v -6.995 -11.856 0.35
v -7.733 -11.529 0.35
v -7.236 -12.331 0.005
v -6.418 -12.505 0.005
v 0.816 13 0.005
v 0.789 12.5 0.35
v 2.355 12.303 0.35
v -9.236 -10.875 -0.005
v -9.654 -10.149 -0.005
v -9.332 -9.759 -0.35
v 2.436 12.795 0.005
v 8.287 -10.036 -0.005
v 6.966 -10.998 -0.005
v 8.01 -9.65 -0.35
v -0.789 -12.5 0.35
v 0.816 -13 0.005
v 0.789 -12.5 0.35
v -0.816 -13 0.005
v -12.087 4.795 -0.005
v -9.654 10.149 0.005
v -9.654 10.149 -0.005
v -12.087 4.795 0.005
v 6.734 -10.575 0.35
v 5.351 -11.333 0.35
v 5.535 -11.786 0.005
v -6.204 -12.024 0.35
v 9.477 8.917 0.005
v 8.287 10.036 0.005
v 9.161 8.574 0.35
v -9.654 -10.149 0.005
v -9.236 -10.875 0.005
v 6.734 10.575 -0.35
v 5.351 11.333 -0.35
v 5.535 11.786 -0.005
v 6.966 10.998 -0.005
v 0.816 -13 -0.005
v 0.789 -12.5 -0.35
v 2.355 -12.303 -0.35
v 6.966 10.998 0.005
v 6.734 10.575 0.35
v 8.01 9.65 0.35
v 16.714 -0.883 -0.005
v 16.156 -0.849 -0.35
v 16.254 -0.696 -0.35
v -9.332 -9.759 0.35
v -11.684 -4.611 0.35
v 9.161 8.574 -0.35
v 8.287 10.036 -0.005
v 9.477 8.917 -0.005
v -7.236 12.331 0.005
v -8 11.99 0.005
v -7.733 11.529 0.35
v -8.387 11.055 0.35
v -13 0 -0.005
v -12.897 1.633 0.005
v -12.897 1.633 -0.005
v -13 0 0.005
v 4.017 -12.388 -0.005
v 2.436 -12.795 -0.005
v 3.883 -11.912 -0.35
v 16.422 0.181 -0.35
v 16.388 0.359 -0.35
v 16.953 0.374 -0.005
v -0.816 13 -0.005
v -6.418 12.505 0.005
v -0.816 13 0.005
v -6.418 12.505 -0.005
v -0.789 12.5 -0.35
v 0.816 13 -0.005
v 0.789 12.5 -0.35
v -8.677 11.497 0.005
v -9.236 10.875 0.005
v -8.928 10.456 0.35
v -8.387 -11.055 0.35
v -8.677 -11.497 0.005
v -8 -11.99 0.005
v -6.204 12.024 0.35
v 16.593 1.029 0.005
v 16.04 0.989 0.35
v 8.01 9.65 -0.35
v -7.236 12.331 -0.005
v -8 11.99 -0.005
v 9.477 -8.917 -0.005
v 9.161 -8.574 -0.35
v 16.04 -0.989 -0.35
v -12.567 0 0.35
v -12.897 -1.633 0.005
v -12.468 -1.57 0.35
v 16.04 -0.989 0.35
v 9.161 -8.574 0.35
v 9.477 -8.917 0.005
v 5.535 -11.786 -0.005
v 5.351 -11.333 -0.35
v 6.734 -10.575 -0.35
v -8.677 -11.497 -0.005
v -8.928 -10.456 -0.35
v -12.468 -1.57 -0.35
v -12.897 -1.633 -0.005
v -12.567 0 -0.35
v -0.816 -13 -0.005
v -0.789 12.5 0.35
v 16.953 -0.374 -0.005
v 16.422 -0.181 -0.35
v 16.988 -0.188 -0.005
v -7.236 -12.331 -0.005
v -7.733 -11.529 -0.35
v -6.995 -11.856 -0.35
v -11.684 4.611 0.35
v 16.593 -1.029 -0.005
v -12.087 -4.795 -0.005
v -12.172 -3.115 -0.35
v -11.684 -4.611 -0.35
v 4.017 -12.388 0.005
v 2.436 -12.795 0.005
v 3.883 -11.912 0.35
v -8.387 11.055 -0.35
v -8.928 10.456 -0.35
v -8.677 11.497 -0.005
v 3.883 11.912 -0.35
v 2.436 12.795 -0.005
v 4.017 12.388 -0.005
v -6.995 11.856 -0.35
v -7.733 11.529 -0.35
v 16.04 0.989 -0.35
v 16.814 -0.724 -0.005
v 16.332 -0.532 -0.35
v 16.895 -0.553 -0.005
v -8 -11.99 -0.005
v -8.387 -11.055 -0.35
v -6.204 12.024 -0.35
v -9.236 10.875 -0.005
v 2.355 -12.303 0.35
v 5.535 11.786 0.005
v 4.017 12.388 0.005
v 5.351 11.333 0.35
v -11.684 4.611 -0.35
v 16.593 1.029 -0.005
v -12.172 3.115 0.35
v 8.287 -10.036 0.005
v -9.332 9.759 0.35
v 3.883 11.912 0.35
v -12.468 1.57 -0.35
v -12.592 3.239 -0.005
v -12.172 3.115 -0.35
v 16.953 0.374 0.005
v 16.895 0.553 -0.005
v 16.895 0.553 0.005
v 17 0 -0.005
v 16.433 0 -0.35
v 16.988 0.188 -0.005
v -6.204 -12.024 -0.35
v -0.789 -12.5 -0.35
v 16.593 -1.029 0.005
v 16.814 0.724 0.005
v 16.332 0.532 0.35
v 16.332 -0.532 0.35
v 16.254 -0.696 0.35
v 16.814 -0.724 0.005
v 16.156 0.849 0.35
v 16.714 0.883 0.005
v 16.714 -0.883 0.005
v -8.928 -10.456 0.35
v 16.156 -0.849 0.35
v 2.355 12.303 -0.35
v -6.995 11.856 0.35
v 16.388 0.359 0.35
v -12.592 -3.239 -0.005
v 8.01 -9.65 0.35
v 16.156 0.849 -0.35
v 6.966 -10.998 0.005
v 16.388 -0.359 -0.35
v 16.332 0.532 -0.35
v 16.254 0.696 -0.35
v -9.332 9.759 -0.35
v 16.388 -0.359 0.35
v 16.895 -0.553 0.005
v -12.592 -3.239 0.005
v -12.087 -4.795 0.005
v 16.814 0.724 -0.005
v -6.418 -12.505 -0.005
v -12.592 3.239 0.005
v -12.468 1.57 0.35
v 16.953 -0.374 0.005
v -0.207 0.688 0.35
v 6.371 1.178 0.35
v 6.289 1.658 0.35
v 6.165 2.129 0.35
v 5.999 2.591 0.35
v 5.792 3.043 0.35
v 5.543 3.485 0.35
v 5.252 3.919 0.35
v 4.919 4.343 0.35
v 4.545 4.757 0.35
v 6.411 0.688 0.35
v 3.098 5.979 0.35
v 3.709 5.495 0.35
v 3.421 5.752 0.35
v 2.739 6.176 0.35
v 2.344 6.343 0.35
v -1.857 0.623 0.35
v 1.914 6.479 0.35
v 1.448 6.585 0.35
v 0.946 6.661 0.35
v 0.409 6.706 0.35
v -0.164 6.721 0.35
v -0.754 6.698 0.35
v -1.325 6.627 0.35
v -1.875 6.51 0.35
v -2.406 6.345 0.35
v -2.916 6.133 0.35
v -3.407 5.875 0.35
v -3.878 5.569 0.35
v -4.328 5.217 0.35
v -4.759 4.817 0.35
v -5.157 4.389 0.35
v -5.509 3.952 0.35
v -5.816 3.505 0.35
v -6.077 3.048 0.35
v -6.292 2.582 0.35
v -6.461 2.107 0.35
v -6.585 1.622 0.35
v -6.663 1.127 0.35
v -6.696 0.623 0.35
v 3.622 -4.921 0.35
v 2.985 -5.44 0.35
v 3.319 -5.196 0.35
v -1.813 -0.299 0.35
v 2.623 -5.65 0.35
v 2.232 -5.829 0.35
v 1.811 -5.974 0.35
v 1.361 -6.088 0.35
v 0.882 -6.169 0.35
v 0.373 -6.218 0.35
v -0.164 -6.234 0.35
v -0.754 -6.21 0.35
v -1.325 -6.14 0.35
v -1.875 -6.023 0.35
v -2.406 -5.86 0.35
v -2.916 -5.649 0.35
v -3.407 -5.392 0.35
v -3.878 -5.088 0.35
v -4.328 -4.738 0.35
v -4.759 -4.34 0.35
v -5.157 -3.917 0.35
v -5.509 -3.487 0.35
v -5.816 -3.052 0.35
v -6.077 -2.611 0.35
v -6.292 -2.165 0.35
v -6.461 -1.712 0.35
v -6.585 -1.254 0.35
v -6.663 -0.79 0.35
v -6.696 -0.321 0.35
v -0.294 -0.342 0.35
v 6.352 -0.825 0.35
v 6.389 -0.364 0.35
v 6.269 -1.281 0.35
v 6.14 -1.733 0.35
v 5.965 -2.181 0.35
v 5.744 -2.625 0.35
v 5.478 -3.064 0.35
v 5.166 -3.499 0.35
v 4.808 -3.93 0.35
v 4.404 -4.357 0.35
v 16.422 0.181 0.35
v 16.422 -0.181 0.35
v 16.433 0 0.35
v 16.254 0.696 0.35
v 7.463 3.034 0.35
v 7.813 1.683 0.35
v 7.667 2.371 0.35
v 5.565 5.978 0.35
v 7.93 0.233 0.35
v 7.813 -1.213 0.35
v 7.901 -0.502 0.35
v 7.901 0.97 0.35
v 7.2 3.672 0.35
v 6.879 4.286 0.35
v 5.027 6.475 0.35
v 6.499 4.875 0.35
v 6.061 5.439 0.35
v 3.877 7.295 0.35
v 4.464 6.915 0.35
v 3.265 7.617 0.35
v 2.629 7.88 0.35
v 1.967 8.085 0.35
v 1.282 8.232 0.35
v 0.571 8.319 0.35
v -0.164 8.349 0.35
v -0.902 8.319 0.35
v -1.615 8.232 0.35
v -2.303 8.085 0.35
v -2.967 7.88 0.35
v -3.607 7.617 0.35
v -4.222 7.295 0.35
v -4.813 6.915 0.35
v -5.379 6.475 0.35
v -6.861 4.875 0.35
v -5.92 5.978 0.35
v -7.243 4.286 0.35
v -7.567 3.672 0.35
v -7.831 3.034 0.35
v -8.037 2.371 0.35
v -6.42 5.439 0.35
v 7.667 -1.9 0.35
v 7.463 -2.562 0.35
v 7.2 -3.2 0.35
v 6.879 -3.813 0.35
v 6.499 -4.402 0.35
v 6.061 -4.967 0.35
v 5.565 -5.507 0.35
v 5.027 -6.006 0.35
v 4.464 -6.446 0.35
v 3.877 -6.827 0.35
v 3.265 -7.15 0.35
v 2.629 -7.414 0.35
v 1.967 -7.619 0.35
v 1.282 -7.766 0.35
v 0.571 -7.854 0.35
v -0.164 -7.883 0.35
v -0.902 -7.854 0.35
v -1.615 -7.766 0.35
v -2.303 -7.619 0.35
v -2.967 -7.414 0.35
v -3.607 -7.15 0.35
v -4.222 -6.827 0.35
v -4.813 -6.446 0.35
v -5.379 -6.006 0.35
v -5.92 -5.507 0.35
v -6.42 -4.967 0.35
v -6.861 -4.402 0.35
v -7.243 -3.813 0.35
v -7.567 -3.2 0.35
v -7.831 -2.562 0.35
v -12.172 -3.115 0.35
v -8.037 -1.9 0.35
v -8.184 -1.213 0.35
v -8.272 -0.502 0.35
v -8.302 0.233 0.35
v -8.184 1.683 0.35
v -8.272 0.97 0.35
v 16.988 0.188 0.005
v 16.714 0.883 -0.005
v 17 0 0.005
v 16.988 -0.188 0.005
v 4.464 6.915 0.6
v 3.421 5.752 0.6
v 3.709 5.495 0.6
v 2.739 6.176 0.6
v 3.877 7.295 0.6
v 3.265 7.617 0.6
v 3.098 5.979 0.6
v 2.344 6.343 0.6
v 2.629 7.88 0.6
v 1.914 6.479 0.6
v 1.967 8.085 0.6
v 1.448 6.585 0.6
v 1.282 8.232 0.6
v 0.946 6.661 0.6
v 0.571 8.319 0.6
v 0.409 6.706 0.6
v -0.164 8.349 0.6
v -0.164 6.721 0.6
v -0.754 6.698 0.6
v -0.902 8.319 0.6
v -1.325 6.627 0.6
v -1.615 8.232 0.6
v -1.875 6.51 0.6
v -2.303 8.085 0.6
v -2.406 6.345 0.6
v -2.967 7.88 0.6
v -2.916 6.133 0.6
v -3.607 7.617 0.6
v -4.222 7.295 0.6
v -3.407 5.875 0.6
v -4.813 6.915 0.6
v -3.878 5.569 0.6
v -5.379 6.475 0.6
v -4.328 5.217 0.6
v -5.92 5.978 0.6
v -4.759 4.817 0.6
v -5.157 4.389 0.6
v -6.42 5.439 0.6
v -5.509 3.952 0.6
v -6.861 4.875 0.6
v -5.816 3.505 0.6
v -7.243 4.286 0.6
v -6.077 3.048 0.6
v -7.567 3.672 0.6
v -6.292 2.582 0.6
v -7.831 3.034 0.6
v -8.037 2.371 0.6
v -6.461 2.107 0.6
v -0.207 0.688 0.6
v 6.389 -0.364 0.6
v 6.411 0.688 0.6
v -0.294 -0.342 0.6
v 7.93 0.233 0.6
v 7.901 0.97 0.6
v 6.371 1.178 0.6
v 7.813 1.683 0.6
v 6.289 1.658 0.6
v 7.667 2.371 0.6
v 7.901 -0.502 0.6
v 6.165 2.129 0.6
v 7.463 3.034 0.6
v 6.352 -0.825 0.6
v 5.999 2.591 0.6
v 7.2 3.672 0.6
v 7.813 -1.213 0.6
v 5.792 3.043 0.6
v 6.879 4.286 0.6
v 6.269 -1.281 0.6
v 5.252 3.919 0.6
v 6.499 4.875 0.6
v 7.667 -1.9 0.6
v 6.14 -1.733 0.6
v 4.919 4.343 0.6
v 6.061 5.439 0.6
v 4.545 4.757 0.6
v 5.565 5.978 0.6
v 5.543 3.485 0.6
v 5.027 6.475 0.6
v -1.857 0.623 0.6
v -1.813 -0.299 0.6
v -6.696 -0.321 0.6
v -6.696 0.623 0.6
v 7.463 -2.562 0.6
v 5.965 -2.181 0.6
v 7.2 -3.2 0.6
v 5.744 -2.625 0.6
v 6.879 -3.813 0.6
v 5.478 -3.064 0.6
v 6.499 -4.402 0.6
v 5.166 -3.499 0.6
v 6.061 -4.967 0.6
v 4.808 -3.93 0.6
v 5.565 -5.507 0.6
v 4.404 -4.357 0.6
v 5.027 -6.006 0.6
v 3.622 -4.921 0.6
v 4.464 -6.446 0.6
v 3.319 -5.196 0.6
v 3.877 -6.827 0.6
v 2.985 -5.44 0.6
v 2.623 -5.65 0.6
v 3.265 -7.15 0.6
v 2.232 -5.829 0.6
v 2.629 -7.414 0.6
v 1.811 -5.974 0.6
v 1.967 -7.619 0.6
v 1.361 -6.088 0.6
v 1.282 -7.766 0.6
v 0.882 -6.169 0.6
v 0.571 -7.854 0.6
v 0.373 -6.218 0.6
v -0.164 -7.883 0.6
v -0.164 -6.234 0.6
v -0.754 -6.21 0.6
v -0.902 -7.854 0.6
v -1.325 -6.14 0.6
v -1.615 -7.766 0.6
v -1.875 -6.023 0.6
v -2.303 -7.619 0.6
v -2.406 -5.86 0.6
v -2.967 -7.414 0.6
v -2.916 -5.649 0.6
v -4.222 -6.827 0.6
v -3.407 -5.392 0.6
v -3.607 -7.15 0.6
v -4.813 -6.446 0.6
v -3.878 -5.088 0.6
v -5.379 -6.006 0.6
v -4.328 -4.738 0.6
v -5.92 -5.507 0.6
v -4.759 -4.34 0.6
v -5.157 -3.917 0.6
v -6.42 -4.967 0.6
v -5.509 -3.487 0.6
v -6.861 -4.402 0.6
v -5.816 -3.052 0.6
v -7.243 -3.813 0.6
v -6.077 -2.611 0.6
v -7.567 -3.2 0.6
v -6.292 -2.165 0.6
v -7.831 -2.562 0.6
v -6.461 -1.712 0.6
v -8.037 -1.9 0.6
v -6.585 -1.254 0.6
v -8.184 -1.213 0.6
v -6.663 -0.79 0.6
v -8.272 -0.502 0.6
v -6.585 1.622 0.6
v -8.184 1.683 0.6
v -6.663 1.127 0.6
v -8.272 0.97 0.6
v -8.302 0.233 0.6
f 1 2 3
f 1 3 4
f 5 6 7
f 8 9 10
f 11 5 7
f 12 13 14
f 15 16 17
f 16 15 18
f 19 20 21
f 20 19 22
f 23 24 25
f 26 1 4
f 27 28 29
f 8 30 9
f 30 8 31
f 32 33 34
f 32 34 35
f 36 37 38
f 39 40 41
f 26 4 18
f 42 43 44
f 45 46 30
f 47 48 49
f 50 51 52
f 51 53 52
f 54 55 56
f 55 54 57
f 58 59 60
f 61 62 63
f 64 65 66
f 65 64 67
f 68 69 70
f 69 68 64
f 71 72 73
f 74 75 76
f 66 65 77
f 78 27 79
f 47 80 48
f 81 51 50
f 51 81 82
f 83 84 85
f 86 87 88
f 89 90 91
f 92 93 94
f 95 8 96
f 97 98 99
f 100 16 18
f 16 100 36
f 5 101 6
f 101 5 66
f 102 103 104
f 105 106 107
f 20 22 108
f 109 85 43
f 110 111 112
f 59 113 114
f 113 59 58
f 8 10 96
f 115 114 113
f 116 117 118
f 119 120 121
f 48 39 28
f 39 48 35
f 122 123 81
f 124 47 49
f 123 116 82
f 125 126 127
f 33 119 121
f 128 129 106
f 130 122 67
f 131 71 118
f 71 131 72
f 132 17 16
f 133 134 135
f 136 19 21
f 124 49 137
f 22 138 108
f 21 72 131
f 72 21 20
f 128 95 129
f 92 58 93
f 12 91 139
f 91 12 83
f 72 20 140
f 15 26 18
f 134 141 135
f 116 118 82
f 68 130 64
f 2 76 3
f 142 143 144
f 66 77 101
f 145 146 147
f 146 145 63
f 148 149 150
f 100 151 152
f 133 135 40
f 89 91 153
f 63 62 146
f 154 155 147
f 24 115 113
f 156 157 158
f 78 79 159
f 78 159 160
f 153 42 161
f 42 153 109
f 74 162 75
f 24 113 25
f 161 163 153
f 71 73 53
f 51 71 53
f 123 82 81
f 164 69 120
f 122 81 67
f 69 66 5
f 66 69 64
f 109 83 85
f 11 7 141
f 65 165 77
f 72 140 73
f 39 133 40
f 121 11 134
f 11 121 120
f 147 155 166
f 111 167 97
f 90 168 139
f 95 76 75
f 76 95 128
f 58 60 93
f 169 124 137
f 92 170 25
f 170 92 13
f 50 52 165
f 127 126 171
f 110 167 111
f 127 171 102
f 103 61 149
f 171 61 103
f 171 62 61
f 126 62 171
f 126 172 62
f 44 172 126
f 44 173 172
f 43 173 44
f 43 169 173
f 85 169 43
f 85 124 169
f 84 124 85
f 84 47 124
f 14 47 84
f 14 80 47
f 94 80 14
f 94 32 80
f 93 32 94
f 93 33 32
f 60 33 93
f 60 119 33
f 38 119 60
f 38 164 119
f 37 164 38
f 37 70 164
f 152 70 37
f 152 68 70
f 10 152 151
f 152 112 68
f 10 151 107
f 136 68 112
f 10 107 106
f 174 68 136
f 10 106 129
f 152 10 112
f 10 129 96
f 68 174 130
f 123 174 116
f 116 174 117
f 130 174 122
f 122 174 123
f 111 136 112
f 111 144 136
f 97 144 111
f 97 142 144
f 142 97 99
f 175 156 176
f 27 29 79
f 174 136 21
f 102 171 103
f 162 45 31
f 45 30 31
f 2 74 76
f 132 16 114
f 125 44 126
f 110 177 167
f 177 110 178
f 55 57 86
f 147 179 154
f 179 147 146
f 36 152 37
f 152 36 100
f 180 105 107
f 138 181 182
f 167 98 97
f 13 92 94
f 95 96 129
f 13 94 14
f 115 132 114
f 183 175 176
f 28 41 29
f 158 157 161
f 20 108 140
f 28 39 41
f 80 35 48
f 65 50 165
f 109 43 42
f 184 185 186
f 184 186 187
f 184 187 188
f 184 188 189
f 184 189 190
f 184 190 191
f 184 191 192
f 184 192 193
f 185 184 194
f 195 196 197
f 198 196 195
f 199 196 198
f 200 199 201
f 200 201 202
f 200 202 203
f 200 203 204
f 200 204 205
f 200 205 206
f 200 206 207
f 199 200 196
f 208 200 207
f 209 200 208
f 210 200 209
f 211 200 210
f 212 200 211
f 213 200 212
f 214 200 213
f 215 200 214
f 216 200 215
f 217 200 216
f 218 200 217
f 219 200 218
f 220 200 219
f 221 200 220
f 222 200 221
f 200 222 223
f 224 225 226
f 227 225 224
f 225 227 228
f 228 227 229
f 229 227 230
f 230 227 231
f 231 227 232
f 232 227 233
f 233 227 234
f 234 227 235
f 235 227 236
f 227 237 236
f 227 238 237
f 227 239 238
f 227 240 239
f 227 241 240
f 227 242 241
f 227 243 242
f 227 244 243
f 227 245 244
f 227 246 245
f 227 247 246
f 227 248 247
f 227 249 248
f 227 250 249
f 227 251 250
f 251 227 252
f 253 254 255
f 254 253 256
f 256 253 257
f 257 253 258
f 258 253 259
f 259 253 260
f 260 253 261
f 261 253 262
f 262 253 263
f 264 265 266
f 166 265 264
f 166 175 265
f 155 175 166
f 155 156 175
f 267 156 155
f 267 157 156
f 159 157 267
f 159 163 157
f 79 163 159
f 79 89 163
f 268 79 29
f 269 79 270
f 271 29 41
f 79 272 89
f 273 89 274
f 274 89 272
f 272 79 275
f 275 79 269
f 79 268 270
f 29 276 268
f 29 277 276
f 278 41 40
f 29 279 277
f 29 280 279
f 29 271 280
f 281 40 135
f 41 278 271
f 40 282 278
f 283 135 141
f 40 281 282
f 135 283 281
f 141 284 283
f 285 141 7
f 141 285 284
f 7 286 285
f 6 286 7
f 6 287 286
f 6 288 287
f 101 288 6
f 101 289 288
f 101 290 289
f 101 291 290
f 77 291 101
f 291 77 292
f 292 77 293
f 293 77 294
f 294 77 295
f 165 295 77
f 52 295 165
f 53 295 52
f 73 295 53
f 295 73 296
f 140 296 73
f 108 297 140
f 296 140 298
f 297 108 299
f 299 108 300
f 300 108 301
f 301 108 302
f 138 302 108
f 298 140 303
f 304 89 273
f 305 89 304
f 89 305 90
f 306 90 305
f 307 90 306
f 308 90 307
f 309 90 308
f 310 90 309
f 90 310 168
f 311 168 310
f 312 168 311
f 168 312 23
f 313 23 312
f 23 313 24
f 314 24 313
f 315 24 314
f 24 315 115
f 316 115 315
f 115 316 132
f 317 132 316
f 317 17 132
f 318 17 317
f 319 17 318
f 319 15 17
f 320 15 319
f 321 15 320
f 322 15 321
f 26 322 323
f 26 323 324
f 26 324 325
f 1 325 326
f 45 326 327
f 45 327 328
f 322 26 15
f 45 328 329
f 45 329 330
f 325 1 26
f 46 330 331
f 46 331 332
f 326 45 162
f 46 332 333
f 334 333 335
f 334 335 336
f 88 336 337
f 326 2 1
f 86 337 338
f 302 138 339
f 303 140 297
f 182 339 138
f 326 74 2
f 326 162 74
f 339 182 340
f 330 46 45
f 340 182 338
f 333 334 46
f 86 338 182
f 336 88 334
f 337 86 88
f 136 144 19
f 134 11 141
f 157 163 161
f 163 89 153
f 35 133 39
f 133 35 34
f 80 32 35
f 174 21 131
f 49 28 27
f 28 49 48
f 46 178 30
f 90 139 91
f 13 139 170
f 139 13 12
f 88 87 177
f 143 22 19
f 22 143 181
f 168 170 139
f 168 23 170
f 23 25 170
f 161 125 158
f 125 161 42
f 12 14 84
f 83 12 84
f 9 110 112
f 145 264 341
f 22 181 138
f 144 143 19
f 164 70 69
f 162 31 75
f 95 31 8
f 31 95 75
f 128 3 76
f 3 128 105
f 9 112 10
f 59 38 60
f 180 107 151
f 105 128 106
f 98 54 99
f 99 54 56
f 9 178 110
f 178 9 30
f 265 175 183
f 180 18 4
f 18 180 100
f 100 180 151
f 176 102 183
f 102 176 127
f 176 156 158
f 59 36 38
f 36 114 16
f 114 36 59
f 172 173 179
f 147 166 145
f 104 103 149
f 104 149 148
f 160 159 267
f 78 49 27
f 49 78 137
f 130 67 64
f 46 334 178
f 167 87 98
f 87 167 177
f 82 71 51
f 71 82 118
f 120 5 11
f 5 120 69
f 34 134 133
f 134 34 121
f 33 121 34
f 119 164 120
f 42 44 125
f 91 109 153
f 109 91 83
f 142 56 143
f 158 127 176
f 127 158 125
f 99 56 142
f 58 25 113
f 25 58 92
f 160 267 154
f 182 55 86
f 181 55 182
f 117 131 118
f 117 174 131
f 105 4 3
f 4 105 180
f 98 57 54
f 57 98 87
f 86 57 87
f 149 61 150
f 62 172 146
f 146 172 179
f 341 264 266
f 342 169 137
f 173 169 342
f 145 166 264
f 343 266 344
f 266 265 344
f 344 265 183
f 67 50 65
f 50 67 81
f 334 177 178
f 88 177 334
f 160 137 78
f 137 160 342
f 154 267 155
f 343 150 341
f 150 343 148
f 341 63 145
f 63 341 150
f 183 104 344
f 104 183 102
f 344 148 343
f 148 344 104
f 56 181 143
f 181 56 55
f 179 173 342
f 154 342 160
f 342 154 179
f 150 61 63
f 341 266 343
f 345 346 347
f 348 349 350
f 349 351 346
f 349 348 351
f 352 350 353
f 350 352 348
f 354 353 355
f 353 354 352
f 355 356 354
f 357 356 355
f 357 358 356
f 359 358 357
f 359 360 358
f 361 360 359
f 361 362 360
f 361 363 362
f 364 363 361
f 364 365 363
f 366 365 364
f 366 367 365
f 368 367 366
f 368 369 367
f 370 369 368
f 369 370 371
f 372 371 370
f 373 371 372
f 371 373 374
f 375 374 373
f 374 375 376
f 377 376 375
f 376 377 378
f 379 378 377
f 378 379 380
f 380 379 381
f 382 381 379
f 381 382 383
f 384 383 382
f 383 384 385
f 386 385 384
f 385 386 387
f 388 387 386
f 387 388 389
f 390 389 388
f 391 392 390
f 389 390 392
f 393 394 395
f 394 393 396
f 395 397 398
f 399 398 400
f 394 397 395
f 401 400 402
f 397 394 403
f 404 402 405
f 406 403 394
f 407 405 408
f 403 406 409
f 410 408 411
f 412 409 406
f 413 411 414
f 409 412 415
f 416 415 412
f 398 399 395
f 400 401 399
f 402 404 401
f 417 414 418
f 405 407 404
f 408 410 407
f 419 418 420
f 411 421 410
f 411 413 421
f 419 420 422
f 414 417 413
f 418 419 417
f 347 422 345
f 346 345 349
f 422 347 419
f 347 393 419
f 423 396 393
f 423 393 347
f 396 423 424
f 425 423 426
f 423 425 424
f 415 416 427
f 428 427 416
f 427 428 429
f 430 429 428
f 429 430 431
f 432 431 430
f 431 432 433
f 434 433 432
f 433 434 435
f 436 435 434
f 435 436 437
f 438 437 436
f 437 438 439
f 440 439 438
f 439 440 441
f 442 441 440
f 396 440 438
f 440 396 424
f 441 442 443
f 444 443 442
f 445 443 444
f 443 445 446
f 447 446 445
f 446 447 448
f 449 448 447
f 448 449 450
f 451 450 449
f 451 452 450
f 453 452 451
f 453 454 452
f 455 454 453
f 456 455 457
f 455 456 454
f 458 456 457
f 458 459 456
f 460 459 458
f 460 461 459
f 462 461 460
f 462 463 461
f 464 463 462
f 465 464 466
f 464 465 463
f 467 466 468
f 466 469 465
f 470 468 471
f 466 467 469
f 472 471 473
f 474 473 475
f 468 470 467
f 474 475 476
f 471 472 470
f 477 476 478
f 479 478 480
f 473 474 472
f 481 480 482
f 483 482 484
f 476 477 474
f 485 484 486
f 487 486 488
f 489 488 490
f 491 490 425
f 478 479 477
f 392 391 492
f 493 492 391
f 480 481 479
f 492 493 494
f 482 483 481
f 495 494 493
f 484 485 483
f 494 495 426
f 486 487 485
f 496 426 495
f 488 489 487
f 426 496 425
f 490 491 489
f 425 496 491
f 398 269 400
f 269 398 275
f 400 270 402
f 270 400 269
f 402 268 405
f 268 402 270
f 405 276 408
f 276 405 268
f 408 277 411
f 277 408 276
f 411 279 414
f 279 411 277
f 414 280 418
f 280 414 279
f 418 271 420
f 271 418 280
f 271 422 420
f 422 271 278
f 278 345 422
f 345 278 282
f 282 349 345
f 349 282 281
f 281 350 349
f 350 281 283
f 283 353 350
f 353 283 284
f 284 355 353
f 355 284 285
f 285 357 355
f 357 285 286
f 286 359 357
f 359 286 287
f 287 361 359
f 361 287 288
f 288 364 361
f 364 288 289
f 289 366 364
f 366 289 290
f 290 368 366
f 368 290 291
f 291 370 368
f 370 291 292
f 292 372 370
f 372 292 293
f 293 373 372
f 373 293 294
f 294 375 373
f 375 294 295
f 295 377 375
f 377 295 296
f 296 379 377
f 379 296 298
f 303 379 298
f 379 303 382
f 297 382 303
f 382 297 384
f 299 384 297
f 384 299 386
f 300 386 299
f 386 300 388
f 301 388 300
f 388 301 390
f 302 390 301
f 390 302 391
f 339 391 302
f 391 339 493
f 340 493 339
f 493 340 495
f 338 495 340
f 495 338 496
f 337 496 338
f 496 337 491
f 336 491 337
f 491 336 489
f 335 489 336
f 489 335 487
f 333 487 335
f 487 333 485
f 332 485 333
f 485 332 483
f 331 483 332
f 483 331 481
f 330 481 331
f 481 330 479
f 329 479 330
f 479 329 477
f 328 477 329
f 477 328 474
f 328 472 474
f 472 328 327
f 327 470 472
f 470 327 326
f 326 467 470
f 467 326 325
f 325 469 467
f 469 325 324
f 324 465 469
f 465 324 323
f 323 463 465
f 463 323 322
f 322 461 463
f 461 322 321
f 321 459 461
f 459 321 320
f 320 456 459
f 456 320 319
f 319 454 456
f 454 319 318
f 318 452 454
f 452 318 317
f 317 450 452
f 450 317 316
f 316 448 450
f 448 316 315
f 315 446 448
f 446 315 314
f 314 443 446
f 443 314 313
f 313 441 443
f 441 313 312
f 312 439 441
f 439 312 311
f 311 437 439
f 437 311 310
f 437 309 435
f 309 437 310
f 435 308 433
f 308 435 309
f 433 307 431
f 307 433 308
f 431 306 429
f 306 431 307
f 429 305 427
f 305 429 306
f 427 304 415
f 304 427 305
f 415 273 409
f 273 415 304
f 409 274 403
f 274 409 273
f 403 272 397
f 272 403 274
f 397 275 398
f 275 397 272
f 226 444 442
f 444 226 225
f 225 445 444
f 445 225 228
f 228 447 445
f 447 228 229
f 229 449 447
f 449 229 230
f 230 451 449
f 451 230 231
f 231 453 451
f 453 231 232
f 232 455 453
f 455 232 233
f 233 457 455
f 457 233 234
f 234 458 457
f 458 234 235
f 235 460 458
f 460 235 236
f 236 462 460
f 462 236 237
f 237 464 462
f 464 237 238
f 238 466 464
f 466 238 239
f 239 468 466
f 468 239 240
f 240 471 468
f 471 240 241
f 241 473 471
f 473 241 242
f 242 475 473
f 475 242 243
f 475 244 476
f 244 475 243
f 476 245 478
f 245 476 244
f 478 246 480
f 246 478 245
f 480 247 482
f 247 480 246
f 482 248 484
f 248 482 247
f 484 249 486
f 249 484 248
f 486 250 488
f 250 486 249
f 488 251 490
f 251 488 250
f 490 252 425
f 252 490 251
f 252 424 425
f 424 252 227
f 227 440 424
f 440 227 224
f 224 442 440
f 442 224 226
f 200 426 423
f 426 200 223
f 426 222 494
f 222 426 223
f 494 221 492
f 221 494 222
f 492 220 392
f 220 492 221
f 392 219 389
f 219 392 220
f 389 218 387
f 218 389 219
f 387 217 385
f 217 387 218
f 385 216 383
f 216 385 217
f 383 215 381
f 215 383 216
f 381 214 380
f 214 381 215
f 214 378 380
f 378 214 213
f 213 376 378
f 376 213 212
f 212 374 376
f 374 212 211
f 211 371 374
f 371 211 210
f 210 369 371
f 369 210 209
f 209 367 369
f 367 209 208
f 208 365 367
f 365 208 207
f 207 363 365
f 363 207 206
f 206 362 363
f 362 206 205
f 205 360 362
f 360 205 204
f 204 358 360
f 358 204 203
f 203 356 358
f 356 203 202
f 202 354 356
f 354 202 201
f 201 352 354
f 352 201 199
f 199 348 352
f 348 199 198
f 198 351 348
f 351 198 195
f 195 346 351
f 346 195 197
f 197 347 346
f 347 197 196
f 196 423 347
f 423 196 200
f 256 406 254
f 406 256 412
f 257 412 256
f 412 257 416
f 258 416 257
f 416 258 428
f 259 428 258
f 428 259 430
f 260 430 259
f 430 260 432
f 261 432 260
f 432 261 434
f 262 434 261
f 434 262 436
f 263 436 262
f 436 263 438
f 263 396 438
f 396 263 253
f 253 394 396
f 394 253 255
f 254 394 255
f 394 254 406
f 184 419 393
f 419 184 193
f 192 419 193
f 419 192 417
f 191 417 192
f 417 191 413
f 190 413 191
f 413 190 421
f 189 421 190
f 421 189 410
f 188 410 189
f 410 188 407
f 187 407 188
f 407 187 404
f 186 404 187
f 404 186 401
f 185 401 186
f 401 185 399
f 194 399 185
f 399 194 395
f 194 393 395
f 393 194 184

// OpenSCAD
// Funky pick 1.2 - a parametric symmetrical plectrum with optional unicode text/character embossing, Antti Suomela January 2017
// CC-BY-SA-NC - Creative Commons Attribution-NonCommercial-ShareAlike 3.0
// Changes: 
// * 1.1 -> 1.2 fixed an error in plectrum size and emboss height generation, added a further embossing option (both sides), added an emboss height parameter, other slight improvements that shorten the code and make it easier to read
// * 1.0 -> 1.1 embossing now happens only on one side (which is supposed to be the top side when printed)

/* Set thickness, length, and other parameters as you like. */ 
thickness = 0.7;        // plectrum thickness, as expected, default: 0.7 
length = 30;            // from base to tip (hint: keep the plectrum longer than it is wide for best results) default: 30
width = 26;             // speaks for itself, default: 26
taper = 1;              // default: 1mm taper distance from the thick bit to the very edge

/* Use these to emboss (or cut) something to the plectrum. */
text = "\u262e";                            // the text to be engraved into the plectrum, default: "\u262e"
font = "Arial Unicode MS:style=Regular";    // default: "Arial Unicode MS:style=Regular" 
fontsize = 16;                              // font size selection, 0 = "automatic" of sorts, default: 16
emboss = 1;                                 // If emboss is 0, the text is cut into the plectrum, not embossed. If emboss is 1, the text is embossed on one side. If 2, it is embossed on both sides. Note that emboss is better for actual text and cutting may be appropriate for certain unicode characters. Default: 1

emboss_height = 0.25;                       // default: 0.25 (mm)

/* Not commonly changed, but nevertheless changeable variables. Chunk and funk change the shape of the plectrum in a certain way. Experiment! :-) */
chunk = 0.327;         // practical range 0 to 0.345 to avoid going beyond set length and width parameters, experiment! :-) (default: 0.327)
funk = 0.2;            // practical range 0 to 0.3 without going beyond set length and width parameters (default: 0.2)

module main_part(t) {               // this establishes the shape and size of the plectrum, the t parameter is the thickness
    linear_extrude(height = t, convexity = 10, center = true)
    resize(newsize=[length, width, thickness])
    hull() {
        circle(width / 2, $fn = 50);                            // main part
        translate([funk * -length, chunk * width, 0])
            circle(4, $fn = 30);              // base corner #1
        translate([funk * -length, chunk * -width, 0])
            circle(4, $fn = 30);              // base corner #2
        translate([length - width / 2 - 1.5, 0, 0])
            circle(1.5, $fn = 50);                              // tip
    }
}
module taper() {                    // this does the tapering at the edge of the plectrum
    hull() {
            resize(newsize=[length - taper, width - taper, thickness])      
            main_part(thickness);
            main_part(0.01);        
    }
}

module create_text() {              // creates the text in the correct orientation
    rotate(90)
    if (fontsize == 0) { text(text, size = 9 - len(text), font = font, valign = "center", halign = "center", $fn = 70); }
    else { text(text, size = fontsize, font = font, valign = "center", halign = "center", $fn = 70); }
}

module emboss() {                   // embosses or cuts the text into the plectrum
    if (emboss == 0) { 
        linear_extrude(height = thickness * 1.5, convexity = 10, center = true) 
        create_text();
        }
    else if (emboss == 1) {
        translate([0, 0, thickness / 2])
        linear_extrude(height = emboss_height, convexity = 10)  
        create_text();
    }
    else {
        linear_extrude(height = thickness + emboss_height * 2, convexity = 10, center = true)  
        create_text();
    }
}
module all_together_now() {         // here we put it all together
    if (emboss == 0) {
        difference() {    
            taper();
            emboss();
        }   
    }
    else {
       taper();
       emboss();
    }
} 

all_together_now();
